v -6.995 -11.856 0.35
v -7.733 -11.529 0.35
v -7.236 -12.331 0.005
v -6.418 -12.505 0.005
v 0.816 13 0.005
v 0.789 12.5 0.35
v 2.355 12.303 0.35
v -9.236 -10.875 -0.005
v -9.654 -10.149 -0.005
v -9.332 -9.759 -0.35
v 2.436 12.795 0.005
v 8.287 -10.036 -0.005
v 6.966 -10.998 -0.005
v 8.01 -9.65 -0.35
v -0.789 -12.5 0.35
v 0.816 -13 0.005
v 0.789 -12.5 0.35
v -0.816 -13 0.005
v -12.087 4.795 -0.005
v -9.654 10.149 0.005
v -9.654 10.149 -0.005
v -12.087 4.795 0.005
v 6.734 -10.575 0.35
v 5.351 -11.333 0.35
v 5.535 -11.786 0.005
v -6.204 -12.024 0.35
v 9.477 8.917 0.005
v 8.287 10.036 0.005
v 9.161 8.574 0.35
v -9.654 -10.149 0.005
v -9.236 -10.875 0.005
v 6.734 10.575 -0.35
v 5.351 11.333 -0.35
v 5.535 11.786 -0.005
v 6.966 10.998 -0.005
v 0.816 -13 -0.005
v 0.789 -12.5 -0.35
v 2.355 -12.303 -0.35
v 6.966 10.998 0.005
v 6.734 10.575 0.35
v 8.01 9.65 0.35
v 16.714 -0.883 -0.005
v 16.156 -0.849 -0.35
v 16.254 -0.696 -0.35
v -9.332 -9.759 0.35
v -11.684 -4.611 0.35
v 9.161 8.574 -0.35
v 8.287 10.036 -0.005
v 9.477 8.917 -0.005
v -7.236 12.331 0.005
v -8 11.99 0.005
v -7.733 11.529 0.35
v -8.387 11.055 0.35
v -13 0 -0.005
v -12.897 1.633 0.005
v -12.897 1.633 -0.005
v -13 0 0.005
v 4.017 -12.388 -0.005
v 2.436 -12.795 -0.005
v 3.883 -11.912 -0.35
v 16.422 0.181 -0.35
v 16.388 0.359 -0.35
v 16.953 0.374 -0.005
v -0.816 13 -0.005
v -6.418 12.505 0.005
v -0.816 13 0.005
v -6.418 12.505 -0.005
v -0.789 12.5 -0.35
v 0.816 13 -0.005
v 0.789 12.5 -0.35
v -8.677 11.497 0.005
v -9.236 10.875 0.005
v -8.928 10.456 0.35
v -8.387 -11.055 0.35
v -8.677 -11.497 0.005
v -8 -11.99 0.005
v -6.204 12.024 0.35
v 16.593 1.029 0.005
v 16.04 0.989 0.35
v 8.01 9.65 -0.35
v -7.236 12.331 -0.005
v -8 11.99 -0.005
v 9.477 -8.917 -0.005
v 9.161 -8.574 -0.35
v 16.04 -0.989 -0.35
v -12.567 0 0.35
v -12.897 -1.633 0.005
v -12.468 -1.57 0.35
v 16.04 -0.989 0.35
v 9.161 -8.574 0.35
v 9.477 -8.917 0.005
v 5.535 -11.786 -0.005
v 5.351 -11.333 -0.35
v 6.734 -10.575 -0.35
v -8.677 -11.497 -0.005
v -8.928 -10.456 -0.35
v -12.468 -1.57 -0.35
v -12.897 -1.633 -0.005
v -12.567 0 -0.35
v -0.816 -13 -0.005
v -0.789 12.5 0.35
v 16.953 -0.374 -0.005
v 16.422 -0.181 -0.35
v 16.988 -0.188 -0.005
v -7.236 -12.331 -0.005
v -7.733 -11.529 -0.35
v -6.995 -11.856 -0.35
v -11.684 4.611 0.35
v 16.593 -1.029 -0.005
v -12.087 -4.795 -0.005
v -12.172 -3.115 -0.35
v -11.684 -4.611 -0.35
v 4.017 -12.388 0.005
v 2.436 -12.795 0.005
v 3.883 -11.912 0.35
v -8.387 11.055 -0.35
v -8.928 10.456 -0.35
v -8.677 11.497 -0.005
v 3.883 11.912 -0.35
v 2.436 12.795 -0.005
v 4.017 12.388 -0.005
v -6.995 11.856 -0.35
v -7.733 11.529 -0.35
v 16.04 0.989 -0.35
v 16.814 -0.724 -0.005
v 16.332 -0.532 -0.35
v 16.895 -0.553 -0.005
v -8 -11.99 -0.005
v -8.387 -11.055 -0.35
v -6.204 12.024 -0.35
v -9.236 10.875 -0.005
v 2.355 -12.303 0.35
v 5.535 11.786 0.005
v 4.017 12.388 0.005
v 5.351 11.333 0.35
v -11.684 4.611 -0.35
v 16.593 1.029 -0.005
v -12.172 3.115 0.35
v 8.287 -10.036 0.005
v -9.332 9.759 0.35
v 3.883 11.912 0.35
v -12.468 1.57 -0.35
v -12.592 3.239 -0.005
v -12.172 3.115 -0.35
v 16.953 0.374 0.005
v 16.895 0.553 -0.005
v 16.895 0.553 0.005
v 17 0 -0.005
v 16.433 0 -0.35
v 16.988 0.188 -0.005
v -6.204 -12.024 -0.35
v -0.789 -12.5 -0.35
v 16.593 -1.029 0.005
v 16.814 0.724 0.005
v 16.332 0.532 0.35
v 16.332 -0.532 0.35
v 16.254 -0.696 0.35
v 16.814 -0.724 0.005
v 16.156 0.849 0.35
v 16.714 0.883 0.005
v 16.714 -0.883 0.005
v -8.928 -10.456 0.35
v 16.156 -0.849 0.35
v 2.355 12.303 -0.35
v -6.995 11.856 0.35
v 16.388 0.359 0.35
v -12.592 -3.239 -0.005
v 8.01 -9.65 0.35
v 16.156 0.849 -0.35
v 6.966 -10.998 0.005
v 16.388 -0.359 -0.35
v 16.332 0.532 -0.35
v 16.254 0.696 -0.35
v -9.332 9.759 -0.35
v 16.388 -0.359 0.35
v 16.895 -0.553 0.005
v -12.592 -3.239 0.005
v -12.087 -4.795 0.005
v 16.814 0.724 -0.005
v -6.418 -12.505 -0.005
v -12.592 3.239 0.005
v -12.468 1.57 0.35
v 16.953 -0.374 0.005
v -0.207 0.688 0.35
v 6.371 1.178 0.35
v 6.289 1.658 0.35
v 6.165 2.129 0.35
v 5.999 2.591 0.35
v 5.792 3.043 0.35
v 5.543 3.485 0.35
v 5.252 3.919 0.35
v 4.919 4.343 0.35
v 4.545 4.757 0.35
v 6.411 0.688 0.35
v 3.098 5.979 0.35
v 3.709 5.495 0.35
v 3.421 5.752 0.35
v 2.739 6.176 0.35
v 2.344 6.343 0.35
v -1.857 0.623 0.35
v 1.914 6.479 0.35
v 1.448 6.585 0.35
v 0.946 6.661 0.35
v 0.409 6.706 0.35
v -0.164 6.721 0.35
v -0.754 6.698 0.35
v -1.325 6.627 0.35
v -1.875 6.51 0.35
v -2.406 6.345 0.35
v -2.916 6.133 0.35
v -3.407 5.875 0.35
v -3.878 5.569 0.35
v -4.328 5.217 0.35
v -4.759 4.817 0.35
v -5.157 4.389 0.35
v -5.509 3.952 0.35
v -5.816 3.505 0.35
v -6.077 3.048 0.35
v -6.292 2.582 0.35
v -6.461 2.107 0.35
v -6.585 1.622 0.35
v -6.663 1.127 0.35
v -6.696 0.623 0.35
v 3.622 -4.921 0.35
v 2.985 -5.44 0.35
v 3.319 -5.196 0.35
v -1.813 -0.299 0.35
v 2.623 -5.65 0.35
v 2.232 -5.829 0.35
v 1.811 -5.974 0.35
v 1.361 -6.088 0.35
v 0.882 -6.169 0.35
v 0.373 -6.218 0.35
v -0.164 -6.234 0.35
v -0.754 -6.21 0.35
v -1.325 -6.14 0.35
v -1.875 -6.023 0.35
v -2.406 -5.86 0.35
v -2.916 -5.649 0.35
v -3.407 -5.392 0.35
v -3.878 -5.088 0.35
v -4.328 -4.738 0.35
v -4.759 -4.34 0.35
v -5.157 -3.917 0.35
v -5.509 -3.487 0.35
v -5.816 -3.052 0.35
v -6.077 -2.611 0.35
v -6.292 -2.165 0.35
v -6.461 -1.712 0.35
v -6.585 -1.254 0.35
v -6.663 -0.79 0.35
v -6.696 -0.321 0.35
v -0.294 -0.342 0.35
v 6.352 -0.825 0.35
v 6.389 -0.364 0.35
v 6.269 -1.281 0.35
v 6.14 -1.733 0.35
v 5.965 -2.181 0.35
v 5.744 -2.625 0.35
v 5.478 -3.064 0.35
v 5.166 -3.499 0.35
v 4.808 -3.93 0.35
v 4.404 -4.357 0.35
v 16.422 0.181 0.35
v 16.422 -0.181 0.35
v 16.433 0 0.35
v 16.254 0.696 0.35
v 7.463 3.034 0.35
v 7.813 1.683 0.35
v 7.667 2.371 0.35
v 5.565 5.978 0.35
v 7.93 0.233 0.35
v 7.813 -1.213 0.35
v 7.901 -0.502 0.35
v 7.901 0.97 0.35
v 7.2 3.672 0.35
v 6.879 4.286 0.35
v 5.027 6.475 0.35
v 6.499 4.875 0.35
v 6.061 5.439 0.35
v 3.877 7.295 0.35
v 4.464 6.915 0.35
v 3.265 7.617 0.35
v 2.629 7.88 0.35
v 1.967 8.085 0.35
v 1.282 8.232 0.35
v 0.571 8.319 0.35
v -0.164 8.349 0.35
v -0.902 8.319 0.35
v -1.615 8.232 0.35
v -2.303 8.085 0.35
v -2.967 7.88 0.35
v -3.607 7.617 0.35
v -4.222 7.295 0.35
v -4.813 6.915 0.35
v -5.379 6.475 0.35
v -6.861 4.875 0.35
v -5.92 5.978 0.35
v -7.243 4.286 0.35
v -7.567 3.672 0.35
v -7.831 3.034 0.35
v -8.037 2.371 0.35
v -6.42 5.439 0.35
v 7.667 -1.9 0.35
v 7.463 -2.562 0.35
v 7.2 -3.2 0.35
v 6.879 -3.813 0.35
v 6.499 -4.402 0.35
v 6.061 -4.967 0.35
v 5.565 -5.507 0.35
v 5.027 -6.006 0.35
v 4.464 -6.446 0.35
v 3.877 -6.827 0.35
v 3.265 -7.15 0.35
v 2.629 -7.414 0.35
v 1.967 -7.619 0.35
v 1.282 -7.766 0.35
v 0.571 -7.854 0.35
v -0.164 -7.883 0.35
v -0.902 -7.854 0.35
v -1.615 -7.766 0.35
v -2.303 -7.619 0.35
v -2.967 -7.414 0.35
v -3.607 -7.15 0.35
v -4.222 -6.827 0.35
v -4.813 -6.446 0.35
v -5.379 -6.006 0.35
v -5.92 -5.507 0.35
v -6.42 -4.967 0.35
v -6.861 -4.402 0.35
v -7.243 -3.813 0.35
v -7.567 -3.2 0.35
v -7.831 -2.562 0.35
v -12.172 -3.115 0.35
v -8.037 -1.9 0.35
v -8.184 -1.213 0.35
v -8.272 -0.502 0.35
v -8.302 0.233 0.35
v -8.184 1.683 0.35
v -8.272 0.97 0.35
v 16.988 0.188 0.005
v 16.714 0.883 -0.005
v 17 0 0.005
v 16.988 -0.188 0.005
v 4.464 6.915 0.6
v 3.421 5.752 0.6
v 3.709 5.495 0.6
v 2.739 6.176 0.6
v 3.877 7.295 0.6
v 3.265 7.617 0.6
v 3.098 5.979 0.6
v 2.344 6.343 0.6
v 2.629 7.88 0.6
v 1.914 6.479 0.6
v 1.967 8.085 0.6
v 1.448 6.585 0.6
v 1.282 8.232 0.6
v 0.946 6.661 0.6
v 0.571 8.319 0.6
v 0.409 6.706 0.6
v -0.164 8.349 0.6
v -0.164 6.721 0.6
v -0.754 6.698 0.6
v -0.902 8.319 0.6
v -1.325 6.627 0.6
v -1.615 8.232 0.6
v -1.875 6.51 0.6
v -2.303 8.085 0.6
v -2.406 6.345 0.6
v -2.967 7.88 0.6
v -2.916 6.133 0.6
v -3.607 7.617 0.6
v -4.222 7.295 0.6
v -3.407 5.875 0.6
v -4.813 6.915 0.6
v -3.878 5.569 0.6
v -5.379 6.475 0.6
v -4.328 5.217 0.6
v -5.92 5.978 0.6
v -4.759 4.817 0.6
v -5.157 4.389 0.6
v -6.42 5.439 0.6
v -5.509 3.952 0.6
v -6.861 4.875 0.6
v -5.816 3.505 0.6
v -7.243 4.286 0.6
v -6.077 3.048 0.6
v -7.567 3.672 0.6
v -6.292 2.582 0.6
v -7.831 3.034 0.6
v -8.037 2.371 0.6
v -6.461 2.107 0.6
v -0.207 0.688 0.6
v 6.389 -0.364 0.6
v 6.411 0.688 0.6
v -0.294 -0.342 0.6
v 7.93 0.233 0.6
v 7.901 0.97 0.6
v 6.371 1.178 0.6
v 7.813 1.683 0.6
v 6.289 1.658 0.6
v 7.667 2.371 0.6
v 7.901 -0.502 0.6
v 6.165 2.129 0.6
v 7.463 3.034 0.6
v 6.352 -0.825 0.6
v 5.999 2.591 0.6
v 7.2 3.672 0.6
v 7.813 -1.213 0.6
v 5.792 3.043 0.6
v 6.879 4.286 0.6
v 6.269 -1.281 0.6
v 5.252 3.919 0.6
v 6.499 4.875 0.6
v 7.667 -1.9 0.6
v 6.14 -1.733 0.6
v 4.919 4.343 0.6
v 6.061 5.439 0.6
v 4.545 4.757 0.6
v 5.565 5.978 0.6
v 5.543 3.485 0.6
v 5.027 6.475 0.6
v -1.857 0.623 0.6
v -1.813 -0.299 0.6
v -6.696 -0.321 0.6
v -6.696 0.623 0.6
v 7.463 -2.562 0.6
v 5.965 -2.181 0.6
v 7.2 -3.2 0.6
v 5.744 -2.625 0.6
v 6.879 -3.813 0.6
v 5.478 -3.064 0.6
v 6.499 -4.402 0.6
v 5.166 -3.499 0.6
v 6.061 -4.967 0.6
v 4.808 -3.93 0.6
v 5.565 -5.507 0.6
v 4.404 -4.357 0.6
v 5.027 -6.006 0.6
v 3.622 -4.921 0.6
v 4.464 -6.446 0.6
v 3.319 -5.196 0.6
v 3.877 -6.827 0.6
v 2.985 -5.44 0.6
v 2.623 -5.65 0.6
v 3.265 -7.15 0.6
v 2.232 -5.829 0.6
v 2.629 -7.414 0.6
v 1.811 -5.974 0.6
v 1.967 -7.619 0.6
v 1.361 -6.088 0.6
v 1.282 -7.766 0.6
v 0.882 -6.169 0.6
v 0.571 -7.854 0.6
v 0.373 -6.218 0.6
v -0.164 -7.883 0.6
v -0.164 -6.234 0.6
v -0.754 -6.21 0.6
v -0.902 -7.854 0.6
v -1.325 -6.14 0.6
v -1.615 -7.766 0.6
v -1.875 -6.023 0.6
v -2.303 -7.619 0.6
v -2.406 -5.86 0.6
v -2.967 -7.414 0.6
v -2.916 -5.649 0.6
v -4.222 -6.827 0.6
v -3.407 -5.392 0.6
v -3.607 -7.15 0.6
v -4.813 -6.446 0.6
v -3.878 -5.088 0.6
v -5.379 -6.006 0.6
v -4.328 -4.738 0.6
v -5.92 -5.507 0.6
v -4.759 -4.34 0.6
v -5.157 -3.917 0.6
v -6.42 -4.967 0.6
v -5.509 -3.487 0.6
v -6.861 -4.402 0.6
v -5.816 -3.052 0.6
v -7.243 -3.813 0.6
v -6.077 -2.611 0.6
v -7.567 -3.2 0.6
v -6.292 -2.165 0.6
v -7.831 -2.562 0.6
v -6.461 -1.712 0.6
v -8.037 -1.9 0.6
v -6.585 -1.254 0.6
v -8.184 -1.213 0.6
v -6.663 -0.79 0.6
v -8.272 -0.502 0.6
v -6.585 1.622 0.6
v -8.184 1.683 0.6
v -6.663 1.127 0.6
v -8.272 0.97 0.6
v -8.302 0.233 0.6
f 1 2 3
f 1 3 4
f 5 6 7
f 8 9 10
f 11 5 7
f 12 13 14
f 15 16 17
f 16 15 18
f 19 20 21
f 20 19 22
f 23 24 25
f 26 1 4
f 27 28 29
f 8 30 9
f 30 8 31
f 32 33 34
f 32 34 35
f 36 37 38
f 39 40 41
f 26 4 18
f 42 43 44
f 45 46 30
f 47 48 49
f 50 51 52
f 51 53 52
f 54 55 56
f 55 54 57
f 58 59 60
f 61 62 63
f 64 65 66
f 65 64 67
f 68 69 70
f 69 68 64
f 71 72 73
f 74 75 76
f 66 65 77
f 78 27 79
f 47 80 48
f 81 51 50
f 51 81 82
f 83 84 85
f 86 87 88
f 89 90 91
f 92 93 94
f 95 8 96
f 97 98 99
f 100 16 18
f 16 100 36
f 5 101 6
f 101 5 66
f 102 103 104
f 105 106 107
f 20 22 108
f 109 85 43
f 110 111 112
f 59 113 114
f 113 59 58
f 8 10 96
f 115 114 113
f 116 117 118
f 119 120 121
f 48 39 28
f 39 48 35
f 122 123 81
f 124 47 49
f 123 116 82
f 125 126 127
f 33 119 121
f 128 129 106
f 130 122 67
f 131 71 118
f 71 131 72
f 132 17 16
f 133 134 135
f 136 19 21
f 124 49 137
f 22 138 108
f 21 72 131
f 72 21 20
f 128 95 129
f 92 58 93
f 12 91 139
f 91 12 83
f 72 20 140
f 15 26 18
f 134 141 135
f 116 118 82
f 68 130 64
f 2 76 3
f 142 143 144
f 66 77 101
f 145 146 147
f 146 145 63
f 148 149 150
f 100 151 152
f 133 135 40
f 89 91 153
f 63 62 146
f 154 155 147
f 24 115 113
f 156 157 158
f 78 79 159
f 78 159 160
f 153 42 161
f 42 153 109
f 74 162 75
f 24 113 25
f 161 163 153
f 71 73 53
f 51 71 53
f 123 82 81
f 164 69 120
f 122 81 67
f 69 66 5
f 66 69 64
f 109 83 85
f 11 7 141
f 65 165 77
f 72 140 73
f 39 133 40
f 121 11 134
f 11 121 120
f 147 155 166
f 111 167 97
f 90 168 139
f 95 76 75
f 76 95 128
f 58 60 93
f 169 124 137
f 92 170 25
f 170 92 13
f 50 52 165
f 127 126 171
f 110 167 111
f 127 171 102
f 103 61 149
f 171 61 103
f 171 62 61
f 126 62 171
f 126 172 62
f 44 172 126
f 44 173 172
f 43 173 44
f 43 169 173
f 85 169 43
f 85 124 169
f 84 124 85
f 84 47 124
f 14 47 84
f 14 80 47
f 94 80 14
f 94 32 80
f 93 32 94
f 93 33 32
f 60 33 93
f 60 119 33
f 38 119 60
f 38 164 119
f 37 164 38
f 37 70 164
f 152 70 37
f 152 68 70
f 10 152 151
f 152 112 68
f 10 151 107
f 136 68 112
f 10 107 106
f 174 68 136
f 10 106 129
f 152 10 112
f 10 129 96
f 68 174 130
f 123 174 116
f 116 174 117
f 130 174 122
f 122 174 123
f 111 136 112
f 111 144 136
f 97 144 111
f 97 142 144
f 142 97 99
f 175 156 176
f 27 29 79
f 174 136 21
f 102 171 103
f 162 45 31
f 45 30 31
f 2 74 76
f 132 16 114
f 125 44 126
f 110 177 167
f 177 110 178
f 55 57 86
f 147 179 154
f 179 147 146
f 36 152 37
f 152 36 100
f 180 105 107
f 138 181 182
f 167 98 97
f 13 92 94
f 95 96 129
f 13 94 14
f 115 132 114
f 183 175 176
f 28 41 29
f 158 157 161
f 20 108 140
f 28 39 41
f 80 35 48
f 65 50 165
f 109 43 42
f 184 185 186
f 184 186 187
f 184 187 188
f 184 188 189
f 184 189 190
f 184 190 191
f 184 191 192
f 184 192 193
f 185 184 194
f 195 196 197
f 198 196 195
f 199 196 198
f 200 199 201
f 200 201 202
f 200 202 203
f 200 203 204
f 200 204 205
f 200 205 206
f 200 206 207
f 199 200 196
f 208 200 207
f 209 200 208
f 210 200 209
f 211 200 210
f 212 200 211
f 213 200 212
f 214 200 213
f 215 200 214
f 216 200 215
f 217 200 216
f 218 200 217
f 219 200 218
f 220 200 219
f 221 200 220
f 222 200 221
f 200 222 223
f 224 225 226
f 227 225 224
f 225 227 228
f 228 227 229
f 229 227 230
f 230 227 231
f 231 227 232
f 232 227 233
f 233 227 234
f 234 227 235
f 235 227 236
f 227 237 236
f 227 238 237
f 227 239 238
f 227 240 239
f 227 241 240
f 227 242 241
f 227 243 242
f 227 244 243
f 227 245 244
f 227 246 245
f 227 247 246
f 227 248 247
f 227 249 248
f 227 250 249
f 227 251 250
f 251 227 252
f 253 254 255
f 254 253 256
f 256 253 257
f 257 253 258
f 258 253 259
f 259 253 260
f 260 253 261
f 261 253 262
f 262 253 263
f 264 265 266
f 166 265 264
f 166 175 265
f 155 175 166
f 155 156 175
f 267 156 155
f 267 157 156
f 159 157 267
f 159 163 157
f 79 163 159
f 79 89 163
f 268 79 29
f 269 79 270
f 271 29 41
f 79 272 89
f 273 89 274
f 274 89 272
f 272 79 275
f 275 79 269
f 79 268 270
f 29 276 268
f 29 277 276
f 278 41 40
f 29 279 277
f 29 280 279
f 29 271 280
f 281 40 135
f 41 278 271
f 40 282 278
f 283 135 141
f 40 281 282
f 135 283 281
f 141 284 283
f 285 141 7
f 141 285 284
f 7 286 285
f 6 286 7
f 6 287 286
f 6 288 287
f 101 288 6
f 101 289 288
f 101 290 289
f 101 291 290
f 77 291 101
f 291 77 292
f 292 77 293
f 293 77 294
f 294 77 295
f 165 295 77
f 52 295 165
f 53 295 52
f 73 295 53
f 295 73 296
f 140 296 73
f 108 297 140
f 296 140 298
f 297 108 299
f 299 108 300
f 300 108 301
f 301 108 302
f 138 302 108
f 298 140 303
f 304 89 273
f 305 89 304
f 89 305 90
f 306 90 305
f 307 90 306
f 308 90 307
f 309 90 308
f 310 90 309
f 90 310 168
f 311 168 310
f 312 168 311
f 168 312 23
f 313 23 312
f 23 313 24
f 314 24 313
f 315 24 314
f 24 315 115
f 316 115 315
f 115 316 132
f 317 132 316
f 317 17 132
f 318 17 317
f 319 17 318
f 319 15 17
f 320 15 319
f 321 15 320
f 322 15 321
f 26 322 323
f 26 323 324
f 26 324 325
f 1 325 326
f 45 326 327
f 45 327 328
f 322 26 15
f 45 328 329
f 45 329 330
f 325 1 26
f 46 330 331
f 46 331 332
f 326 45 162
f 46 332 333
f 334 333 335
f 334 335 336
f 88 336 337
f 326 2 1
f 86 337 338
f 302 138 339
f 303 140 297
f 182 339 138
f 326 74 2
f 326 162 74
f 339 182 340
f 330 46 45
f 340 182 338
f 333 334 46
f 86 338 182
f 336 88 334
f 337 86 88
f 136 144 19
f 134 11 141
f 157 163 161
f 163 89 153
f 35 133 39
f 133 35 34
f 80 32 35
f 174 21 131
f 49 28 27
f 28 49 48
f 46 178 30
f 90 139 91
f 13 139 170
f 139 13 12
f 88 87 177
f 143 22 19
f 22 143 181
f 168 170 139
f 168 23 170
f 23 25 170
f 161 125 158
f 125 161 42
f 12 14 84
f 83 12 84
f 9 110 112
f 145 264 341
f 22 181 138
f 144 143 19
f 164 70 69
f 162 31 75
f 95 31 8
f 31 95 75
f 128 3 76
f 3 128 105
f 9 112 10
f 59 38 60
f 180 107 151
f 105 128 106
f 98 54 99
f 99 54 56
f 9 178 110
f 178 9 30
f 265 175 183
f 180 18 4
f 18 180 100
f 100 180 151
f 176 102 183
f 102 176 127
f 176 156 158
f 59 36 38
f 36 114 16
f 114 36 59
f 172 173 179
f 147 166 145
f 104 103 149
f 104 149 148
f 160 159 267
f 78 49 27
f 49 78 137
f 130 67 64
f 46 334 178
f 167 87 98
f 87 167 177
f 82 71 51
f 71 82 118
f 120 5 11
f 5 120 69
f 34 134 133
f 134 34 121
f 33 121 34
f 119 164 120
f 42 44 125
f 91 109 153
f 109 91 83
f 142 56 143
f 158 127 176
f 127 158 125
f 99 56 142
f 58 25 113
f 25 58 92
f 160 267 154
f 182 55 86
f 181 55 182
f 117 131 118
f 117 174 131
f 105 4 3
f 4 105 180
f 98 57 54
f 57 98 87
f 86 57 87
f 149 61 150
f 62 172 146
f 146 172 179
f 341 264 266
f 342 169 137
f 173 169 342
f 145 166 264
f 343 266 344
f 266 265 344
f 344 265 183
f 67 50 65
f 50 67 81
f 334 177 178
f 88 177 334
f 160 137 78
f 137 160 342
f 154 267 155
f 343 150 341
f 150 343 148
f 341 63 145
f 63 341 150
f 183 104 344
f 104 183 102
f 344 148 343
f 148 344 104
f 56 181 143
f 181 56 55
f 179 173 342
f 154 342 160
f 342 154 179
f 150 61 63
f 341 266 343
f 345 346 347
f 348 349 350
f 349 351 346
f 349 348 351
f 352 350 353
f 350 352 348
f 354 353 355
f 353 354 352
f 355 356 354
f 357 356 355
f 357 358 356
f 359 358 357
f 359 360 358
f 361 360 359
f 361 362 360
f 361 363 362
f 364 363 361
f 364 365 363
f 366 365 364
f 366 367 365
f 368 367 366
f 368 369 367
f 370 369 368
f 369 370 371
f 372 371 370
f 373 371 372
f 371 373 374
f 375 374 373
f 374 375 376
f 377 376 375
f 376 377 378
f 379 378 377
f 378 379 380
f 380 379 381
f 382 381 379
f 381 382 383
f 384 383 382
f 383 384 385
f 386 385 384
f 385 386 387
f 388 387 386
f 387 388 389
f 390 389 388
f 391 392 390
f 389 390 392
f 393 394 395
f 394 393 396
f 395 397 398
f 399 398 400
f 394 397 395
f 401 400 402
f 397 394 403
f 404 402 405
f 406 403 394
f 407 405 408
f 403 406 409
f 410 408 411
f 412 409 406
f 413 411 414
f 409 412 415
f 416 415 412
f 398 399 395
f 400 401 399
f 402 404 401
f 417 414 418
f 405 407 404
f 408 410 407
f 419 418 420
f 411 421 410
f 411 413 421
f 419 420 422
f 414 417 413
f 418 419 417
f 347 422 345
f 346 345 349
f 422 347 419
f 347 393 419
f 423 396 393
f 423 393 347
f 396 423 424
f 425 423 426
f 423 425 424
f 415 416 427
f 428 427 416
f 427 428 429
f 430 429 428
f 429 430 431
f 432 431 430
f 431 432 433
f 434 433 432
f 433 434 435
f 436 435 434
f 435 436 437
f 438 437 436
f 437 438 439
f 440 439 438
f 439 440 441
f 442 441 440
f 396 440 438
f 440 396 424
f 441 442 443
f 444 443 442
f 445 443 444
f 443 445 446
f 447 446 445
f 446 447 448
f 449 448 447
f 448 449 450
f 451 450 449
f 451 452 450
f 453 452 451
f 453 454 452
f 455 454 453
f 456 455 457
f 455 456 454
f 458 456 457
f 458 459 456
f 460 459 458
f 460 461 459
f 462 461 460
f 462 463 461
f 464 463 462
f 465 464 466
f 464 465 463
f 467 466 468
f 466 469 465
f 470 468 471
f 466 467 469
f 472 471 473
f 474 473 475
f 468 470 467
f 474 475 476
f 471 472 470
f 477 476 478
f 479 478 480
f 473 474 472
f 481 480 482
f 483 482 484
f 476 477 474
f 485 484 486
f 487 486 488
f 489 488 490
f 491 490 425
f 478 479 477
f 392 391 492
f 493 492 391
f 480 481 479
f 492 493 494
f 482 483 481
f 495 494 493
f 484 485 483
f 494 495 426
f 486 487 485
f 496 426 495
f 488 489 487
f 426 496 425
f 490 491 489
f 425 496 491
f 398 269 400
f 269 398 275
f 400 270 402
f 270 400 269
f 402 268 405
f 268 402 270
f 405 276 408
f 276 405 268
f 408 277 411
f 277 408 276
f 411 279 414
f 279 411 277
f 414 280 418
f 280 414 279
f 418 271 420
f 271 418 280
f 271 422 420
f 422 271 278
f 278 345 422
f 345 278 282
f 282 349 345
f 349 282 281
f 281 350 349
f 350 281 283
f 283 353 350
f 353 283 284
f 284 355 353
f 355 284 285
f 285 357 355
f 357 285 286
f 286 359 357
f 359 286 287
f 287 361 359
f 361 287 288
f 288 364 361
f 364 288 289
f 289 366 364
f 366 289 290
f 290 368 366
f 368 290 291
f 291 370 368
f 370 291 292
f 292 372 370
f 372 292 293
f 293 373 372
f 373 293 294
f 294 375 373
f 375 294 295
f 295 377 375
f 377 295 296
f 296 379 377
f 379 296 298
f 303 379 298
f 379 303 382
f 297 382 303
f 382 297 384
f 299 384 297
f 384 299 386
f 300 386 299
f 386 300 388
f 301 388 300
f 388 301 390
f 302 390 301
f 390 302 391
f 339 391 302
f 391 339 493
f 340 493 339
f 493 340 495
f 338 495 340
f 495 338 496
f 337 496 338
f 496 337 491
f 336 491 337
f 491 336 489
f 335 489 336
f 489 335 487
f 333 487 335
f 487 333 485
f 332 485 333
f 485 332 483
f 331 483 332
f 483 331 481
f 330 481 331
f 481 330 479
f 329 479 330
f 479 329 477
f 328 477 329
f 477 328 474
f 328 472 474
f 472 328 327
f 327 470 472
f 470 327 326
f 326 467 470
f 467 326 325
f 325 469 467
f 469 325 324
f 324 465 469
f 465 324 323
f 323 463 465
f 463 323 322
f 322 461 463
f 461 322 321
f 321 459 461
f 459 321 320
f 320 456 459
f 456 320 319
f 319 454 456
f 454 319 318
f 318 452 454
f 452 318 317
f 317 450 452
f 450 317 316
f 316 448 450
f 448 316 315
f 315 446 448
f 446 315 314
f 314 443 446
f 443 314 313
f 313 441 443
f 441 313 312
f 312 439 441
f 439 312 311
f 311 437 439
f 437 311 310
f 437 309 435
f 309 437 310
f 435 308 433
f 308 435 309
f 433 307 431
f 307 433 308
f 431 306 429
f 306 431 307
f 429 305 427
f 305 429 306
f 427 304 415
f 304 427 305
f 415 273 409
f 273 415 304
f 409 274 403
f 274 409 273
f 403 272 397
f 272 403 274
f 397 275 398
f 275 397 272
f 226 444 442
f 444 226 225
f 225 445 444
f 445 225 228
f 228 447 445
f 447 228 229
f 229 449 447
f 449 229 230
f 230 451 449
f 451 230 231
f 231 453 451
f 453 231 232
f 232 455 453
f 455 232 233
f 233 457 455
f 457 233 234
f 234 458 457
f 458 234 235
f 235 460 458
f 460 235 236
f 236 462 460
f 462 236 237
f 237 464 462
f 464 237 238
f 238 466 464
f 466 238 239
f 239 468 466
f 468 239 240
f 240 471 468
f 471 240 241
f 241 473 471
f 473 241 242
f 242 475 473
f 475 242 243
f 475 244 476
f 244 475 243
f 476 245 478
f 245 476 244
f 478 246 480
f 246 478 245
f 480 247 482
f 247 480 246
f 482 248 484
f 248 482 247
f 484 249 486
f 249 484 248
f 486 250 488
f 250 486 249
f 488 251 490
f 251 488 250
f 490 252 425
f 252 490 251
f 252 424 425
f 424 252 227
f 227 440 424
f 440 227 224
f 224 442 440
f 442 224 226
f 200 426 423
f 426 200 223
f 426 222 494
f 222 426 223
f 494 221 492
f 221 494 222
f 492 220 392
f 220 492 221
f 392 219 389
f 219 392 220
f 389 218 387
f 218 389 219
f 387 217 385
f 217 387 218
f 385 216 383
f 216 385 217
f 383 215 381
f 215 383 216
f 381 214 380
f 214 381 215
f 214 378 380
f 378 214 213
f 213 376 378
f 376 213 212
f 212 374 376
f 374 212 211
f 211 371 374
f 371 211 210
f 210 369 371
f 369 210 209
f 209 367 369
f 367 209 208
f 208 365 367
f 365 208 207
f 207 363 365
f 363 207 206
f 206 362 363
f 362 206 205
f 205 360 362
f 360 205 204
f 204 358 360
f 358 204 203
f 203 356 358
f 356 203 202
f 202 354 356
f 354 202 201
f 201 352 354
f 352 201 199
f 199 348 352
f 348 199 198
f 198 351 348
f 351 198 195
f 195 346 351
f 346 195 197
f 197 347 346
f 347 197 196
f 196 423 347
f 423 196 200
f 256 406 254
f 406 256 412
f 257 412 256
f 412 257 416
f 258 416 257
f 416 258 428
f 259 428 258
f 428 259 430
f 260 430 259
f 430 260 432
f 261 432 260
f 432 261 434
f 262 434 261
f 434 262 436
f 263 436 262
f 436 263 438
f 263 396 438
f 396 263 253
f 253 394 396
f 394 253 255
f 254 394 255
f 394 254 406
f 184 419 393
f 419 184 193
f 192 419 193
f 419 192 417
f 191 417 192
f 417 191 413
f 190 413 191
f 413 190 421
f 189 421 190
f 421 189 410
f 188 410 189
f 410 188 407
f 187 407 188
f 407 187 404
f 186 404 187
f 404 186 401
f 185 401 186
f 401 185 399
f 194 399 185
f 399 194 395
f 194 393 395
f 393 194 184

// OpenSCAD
// Funky pick 1.2 - a parametric symmetrical plectrum with optional unicode text/character embossing, Antti Suomela January 2017
// CC-BY-SA-NC - Creative Commons Attribution-NonCommercial-ShareAlike 3.0
// Changes: 
// * 1.1 -> 1.2 fixed an error in plectrum size and emboss height generation, added a further embossing option (both sides), added an emboss height parameter, other slight improvements that shorten the code and make it easier to read
// * 1.0 -> 1.1 embossing now happens only on one side (which is supposed to be the top side when printed)

/* Set thickness, length, and other parameters as you like. */ 
thickness = 0.7;        // plectrum thickness, as expected, default: 0.7 
length = 30;            // from base to tip (hint: keep the plectrum longer than it is wide for best results) default: 30
width = 26;             // speaks for itself, default: 26
taper = 1;              // default: 1mm taper distance from the thick bit to the very edge

/* Use these to emboss (or cut) something to the plectrum. */
text = "\u262e";                            // the text to be engraved into the plectrum, default: "\u262e"
font = "Arial Unicode MS:style=Regular";    // default: "Arial Unicode MS:style=Regular" 
fontsize = 16;                              // font size selection, 0 = "automatic" of sorts, default: 16
emboss = 1;                                 // If emboss is 0, the text is cut into the plectrum, not embossed. If emboss is 1, the text is embossed on one side. If 2, it is embossed on both sides. Note that emboss is better for actual text and cutting may be appropriate for certain unicode characters. Default: 1

emboss_height = 0.25;                       // default: 0.25 (mm)

/* Not commonly changed, but nevertheless changeable variables. Chunk and funk change the shape of the plectrum in a certain way. Experiment! :-) */
chunk = 0.327;         // practical range 0 to 0.345 to avoid going beyond set length and width parameters, experiment! :-) (default: 0.327)
funk = 0.2;            // practical range 0 to 0.3 without going beyond set length and width parameters (default: 0.2)

module main_part(t) {               // this establishes the shape and size of the plectrum, the t parameter is the thickness
    linear_extrude(height = t, convexity = 10, center = true)
    resize(newsize=[length, width, thickness])
    hull() {
        circle(width / 2, $fn = 50);                            // main part
        translate([funk * -length, chunk * width, 0])
            circle(4, $fn = 30);              // base corner #1
        translate([funk * -length, chunk * -width, 0])
            circle(4, $fn = 30);              // base corner #2
        translate([length - width / 2 - 1.5, 0, 0])
            circle(1.5, $fn = 50);                              // tip
    }
}
module taper() {                    // this does the tapering at the edge of the plectrum
    hull() {
            resize(newsize=[length - taper, width - taper, thickness])      
            main_part(thickness);
            main_part(0.01);        
    }
}

module create_text() {              // creates the text in the correct orientation
    rotate(90)
    if (fontsize == 0) { text(text, size = 9 - len(text), font = font, valign = "center", halign = "center", $fn = 70); }
    else { text(text, size = fontsize, font = font, valign = "center", halign = "center", $fn = 70); }
}

module emboss() {                   // embosses or cuts the text into the plectrum
    if (emboss == 0) { 
        linear_extrude(height = thickness * 1.5, convexity = 10, center = true) 
        create_text();
        }
    else if (emboss == 1) {
        translate([0, 0, thickness / 2])
        linear_extrude(height = emboss_height, convexity = 10)  
        create_text();
    }
    else {
        linear_extrude(height = thickness + emboss_height * 2, convexity = 10, center = true)  
        create_text();
    }
}
module all_together_now() {         // here we put it all together
    if (emboss == 0) {
        difference() {    
            taper();
            emboss();
        }   
    }
    else {
       taper();
       emboss();
    }
} 

all_together_now();
